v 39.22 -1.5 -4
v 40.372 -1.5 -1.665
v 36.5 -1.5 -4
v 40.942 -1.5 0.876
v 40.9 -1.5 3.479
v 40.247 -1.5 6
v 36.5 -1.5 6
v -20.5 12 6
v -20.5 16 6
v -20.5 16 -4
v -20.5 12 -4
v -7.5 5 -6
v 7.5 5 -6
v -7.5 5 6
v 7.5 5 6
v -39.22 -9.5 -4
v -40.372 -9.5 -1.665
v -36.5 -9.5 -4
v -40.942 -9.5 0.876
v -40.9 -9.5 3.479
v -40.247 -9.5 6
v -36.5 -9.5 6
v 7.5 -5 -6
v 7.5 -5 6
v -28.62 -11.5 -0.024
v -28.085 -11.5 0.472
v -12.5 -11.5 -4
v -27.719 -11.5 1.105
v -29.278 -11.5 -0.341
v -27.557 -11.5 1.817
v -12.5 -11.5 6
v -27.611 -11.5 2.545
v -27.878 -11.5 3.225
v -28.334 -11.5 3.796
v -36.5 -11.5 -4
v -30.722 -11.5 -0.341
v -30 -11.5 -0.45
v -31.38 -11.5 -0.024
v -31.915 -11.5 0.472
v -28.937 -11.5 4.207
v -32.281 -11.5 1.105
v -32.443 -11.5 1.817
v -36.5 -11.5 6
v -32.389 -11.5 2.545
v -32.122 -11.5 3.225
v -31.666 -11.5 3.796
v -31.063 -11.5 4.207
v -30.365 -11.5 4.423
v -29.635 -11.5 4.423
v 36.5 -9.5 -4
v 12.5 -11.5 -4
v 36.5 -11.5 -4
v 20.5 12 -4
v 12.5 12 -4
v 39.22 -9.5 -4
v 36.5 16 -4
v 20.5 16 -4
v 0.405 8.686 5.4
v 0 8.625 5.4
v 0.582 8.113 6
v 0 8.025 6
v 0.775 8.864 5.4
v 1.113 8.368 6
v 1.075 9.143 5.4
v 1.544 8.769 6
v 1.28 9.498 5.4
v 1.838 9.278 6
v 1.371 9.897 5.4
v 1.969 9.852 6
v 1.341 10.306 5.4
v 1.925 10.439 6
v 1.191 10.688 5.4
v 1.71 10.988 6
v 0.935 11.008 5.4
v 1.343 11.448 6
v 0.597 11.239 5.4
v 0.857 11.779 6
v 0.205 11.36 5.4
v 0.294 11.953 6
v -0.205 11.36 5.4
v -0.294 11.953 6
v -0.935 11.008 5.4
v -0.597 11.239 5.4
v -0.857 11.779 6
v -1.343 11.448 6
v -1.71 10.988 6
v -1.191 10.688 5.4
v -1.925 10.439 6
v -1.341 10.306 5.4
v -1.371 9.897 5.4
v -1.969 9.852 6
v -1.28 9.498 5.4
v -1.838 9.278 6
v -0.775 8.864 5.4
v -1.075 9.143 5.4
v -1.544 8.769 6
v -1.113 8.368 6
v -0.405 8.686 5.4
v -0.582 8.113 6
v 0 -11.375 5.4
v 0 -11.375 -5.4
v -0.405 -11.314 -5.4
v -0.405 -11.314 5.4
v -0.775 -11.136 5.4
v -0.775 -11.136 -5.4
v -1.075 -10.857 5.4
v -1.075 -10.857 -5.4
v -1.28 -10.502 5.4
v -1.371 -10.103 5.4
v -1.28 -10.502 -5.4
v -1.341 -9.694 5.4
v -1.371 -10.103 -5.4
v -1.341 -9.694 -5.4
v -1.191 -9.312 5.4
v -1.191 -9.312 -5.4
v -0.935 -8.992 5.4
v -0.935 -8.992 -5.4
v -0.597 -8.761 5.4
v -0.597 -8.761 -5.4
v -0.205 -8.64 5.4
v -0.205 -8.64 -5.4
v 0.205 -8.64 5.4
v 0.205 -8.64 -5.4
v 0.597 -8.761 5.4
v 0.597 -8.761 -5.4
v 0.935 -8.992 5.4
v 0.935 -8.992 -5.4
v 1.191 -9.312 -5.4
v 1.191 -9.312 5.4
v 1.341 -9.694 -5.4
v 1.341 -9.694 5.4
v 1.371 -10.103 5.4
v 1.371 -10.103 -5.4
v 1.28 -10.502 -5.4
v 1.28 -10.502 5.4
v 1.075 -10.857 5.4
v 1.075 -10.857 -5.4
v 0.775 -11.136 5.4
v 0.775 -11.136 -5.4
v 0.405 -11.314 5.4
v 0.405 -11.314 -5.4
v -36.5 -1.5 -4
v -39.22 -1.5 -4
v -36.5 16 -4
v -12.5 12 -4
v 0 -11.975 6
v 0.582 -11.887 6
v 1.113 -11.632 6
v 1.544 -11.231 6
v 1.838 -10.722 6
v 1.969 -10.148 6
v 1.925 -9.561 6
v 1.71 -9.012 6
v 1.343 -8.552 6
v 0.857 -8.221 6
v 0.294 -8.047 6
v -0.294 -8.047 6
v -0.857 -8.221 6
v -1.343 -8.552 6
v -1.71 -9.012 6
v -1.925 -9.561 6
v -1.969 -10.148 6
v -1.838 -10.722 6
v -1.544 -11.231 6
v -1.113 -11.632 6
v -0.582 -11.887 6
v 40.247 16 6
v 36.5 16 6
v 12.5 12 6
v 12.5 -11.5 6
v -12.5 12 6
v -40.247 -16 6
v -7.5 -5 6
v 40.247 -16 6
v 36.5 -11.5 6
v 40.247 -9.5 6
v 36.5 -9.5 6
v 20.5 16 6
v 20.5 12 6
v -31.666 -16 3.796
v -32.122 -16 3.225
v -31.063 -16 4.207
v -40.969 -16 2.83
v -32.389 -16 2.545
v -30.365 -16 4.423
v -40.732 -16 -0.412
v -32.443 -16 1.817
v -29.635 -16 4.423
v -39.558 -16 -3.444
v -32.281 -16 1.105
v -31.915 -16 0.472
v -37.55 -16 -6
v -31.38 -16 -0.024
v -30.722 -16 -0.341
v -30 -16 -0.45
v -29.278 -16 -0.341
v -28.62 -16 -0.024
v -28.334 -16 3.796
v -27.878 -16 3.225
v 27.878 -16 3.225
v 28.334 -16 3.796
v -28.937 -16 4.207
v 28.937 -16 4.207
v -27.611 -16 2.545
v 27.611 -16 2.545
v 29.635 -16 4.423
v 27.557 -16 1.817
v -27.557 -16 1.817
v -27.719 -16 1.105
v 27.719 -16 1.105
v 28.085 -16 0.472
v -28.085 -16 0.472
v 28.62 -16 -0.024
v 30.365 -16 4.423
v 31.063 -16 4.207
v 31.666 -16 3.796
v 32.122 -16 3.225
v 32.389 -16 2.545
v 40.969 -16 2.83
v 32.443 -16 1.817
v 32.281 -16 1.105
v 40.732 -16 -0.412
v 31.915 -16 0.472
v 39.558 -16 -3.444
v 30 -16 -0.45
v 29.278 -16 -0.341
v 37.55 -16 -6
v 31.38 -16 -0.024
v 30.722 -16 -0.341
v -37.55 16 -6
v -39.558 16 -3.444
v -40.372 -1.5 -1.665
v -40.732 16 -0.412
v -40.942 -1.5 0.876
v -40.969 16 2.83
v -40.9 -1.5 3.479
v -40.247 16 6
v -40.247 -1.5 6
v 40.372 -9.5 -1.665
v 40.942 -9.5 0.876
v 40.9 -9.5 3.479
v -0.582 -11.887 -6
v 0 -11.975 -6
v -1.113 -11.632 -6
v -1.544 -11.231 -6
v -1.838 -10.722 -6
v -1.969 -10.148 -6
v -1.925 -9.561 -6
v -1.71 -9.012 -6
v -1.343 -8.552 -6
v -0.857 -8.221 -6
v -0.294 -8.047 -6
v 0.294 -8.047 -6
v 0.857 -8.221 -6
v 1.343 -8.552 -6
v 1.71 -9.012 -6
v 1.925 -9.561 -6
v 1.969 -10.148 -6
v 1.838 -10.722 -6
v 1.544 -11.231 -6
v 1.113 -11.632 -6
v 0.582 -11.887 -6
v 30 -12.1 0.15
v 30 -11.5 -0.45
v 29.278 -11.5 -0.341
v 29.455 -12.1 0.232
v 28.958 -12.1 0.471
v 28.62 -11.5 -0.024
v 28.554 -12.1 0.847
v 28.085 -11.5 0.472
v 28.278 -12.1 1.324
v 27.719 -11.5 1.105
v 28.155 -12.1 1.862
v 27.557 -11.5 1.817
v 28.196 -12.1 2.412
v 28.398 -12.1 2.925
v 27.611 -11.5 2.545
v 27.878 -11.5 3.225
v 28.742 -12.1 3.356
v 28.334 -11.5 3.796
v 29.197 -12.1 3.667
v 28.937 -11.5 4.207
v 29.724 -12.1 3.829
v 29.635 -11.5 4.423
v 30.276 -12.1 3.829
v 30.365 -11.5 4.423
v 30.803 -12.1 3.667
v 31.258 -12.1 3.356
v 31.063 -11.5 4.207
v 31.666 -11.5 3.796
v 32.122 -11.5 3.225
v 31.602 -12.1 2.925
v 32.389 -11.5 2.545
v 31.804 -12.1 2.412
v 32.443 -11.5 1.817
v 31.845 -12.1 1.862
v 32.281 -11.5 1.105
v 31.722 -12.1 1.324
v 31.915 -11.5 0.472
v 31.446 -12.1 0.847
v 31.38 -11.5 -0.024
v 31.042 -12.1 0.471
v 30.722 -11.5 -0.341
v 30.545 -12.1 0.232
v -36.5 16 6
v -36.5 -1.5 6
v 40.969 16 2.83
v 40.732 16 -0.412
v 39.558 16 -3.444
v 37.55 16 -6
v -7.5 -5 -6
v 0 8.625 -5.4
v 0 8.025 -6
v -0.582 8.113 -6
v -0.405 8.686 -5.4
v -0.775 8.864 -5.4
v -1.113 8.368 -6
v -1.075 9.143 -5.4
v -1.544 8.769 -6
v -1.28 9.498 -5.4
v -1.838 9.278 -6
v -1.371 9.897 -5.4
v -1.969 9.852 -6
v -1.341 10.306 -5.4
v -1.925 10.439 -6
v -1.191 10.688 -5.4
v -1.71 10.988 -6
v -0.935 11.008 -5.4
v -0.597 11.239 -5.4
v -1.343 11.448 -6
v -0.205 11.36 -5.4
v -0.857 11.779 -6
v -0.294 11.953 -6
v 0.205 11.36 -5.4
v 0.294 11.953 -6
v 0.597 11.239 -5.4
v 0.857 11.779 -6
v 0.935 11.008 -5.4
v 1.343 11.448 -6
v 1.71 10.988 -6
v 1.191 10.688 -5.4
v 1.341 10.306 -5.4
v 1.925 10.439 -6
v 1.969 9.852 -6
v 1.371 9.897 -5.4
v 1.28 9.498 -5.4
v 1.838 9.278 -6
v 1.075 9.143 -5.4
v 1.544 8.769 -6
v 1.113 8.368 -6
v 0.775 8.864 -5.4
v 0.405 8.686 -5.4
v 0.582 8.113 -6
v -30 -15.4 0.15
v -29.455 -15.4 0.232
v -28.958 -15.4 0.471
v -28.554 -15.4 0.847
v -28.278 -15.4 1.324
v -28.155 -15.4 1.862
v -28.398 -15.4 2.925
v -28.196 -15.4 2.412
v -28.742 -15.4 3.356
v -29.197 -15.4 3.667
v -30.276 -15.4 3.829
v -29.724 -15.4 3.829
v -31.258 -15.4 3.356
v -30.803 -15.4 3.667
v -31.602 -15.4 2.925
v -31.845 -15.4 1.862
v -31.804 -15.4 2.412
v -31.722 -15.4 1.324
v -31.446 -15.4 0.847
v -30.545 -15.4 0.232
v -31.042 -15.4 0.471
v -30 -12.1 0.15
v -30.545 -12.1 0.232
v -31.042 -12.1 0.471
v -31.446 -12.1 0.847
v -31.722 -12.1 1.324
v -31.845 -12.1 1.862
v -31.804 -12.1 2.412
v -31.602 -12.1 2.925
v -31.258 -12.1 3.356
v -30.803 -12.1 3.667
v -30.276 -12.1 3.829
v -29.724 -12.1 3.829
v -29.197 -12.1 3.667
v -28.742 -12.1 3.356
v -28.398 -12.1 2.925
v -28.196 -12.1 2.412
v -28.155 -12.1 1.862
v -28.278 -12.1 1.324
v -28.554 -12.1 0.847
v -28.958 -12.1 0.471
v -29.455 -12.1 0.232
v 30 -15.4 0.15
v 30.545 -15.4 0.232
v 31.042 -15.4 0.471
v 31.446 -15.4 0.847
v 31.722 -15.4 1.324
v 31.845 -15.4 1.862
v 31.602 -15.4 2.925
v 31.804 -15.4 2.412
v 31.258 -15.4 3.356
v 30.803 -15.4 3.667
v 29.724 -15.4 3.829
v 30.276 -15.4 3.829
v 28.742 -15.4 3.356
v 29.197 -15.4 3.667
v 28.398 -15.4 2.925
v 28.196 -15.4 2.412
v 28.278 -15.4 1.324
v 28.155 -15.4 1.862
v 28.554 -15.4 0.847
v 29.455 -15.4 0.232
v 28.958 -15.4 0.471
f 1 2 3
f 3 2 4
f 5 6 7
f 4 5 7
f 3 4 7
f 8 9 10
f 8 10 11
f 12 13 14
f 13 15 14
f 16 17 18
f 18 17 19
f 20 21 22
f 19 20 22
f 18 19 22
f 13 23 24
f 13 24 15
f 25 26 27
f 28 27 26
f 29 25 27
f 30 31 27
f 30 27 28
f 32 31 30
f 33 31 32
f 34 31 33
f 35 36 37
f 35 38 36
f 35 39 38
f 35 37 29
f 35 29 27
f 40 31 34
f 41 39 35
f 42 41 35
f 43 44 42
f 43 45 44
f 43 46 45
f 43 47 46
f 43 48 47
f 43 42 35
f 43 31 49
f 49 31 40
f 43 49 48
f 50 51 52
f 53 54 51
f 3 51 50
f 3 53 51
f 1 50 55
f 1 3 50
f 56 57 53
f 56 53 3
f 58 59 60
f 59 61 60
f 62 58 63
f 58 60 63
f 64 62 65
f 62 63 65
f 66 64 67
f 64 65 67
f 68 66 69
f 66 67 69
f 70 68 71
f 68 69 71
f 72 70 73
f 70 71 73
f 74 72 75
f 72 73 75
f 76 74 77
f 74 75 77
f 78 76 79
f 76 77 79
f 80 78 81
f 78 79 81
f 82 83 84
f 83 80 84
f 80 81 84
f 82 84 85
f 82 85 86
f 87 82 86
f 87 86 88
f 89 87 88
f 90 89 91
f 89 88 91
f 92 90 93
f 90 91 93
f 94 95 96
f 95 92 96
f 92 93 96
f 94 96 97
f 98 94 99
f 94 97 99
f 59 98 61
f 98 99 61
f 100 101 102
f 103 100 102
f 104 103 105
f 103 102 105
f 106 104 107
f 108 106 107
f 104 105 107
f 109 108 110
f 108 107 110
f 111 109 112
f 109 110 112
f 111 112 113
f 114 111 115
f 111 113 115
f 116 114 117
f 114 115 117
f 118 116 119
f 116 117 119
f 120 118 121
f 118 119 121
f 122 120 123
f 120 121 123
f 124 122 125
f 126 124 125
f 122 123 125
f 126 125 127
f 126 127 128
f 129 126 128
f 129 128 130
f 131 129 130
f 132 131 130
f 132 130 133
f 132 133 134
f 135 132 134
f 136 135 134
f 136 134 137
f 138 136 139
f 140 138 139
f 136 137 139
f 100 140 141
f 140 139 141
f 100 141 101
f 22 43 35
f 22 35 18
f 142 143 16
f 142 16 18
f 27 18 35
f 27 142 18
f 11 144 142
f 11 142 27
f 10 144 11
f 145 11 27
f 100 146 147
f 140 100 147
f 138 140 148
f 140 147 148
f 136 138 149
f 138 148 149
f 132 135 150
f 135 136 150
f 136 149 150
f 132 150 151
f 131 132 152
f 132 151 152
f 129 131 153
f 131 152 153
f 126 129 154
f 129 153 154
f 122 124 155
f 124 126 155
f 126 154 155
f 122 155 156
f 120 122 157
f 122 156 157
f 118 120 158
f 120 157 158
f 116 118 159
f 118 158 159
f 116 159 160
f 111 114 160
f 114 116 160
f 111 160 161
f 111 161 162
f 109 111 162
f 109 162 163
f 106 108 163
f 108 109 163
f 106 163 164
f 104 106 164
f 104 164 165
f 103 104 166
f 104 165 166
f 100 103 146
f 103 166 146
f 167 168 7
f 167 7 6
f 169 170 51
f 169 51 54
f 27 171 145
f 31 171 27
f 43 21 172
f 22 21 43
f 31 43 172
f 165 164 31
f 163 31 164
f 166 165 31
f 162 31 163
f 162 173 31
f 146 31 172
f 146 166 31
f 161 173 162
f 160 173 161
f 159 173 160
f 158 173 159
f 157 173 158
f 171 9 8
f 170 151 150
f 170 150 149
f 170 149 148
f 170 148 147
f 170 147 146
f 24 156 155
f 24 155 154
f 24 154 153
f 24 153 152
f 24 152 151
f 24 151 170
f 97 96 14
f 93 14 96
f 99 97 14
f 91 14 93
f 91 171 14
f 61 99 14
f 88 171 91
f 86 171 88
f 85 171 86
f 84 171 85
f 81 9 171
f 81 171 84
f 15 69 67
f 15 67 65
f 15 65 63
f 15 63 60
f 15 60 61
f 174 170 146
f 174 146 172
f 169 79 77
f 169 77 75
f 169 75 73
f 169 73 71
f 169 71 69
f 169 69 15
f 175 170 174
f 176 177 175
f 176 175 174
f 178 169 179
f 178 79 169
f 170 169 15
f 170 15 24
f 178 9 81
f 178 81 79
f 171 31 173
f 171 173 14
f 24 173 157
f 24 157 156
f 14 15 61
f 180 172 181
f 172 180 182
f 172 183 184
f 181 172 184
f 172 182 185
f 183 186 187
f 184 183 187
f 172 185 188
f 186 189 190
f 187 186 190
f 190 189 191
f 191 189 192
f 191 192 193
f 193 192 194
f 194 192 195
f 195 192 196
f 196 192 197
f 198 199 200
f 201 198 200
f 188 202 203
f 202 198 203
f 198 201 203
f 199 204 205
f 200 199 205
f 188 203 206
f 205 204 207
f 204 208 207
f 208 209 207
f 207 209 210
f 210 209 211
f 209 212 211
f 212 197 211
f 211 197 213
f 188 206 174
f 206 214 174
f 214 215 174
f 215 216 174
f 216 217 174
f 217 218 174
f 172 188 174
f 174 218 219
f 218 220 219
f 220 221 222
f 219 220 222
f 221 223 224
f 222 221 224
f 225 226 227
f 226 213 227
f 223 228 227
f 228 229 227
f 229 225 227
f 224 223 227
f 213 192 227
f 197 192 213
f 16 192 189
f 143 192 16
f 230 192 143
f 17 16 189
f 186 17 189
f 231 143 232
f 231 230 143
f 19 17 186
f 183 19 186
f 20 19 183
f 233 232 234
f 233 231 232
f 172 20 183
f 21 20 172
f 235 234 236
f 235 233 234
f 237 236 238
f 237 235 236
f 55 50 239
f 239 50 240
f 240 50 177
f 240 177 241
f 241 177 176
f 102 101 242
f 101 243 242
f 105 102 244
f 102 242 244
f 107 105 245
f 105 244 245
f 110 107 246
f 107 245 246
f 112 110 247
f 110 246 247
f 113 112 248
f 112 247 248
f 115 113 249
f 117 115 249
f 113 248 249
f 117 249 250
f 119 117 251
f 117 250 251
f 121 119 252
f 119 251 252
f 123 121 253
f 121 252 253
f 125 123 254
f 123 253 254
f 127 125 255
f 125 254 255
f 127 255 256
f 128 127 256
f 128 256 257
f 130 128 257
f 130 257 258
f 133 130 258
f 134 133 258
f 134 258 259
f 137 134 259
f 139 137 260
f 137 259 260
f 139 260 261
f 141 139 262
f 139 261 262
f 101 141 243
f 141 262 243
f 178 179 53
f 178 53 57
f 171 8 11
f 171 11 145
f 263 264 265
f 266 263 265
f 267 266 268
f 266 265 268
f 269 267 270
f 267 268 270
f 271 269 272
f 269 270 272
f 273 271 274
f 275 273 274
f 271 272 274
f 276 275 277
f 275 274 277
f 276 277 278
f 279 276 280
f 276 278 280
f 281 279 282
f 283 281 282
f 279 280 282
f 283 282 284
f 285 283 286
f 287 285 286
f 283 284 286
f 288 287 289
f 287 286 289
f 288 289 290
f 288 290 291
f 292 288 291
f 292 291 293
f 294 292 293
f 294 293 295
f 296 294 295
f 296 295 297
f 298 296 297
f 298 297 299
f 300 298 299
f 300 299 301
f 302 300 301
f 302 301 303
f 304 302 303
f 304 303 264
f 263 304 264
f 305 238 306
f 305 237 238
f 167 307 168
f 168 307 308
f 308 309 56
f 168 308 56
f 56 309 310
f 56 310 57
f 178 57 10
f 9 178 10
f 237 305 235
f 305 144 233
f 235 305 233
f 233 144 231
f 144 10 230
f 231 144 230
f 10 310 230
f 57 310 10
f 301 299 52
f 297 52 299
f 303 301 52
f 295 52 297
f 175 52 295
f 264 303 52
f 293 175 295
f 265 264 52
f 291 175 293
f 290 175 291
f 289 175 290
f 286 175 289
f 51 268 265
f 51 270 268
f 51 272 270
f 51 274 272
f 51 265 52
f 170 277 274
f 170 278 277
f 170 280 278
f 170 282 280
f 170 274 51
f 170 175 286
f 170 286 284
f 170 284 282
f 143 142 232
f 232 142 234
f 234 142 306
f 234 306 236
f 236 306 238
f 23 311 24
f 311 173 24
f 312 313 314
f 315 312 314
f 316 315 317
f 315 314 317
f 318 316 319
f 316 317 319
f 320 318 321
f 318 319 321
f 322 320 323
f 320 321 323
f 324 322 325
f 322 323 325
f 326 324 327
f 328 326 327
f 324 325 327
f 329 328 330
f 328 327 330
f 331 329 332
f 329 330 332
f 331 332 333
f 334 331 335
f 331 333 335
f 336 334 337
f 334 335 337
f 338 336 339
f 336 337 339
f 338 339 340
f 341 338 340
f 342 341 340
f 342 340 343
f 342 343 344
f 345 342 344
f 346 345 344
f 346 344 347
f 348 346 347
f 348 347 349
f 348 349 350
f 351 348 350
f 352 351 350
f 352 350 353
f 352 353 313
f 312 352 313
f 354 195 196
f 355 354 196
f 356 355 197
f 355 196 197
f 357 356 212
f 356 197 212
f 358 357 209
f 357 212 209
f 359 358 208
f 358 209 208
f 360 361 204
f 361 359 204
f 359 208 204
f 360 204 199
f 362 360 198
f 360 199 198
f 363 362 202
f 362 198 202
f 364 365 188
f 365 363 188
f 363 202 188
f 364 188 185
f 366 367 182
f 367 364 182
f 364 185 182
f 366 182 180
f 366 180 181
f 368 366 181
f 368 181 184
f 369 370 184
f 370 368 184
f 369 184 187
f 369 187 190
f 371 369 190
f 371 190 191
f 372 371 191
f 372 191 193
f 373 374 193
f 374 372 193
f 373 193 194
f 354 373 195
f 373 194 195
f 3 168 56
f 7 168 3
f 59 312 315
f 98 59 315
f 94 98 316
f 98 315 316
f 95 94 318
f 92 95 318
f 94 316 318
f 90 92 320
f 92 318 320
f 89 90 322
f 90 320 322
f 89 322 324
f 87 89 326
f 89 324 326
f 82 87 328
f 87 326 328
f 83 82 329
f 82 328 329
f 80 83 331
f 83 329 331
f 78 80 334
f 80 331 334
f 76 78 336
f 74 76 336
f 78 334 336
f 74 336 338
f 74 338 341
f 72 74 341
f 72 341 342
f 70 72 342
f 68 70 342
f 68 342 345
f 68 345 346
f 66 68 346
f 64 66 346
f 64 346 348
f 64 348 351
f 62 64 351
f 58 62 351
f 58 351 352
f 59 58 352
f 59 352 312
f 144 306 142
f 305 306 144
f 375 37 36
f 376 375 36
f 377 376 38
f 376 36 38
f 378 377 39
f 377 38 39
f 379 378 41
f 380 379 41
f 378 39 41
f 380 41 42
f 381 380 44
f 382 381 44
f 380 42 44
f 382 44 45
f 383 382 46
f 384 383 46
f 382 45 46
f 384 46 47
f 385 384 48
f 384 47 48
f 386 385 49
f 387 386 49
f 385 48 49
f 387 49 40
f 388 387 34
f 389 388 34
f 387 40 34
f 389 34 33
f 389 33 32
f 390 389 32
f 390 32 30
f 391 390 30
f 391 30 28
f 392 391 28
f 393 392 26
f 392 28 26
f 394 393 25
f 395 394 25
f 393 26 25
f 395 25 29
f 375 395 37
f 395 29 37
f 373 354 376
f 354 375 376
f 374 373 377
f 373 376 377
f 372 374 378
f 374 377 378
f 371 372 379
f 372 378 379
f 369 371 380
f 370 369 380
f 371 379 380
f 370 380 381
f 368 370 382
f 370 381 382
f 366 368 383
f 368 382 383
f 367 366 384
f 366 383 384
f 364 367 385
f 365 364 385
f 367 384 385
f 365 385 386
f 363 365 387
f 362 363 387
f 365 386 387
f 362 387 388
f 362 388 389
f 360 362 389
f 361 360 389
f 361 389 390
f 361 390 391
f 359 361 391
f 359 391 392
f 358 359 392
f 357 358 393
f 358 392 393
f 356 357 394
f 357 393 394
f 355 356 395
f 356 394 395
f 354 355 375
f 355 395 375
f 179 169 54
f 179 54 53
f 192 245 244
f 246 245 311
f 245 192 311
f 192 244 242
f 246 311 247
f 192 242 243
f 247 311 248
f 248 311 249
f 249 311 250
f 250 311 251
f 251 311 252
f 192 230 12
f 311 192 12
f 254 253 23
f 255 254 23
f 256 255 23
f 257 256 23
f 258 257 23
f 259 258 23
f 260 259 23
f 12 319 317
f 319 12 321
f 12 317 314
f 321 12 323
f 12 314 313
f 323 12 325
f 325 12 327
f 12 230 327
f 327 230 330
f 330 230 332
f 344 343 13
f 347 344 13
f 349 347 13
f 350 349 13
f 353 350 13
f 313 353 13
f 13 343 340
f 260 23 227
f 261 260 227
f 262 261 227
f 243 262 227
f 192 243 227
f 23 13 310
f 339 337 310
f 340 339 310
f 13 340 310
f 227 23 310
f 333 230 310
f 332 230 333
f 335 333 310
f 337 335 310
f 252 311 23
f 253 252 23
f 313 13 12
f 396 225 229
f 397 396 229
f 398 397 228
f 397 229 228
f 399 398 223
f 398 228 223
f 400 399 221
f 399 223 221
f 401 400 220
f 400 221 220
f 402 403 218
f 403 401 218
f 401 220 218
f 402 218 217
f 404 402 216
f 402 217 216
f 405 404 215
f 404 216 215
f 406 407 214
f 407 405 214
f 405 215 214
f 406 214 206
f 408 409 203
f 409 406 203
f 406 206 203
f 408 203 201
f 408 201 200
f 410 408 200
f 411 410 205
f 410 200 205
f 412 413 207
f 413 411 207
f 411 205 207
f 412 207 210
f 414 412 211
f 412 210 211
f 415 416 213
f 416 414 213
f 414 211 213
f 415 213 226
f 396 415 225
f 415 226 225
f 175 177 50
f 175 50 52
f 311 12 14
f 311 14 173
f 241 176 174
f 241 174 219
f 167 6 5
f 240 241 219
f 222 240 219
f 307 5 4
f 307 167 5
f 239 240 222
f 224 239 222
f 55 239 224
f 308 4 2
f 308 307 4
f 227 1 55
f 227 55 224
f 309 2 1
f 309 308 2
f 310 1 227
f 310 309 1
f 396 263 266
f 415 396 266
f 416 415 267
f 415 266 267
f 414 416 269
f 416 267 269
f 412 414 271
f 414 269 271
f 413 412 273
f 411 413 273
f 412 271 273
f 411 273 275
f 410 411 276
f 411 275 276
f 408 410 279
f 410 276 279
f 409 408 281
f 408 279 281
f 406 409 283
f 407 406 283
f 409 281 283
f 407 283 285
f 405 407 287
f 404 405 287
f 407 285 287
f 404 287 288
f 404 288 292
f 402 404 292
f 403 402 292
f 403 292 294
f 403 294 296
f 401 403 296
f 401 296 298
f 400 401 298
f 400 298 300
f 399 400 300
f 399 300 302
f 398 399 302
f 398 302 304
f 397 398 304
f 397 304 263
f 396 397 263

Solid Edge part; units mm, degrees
sketch "Sketch1" plane through (0, 0, 0) normal (0, 0, 1) x (1, 0, 0)
  line L0 (-41, -16) -> (41, -16)
  line L1 (41, -16) -> (41, 16)
  line L2 (41, 16) -> (-41, 16)
  line L3 (-41, 16) -> (-41, -16)
  dimension "D1" = 32
  dimension "D2" = 82
extrude "Protrusion1" add sketch "Sketch1" along normal mid plane 12
sketch "Sketch2" plane through (0, 0, 6) normal (0, 0, 1) x (1, 0, 0)
  line L0 (20.5, 16) -> (36.5, 16)
  line L1 (36.5, 16) -> (36.5, -11.5)
  line L2 (36.5, -11.5) -> (12.5, -11.5)
  line L3 (12.5, -11.5) -> (12.5, 12)
  line L4 (12.5, 12) -> (20.5, 12)
  line L5 (20.5, 12) -> (20.5, 16)
  dimension "D1" = 6.5
  dimension "D2" = 24
  dimension "D3" = 16
  dimension "D4" = 4
  dimension "D5" = 27.5
  dimension "D6" = 30
extrude "v_1_servo_cutout" cut sketch "Sketch2" against normal blind 10
sketch "Sketch3" plane through (0, 0, 6) normal (0, 0, 1) x (0, 1, 0)
  line L0 (-9.5, -36.5) -> (-9.5, -41)
  line L1 (-9.5, -41) -> (-1.5, -41)
  line L2 (-1.5, -41) -> (-1.5, -36.5)
  line L3 (-1.5, -36.5) -> (-9.5, -36.5)
  dimension "D1" = 8
  dimension "D2" = 2
extrude "Cutout1" cut sketch "Sketch3" against normal up to vertex (10 mm away)
sketch "Sketch4" plane through (0, 0, 6) normal (0, 0, 1) x (0, 1, 0)
  line L0 (-5, -7.5) -> (5, -7.5)
  line L1 (5, -7.5) -> (5, 7.5)
  line L2 (5, 7.5) -> (-5, 7.5)
  line L3 (-5, 7.5) -> (-5, -7.5)
  dimension "D1" = 15
  dimension "D2" = 10
extrude "Cutout2" cut sketch "Sketch4" against normal up to next
sketch "Sketch5" plane through (0, 16, 0) normal (0, 1, 0) x (1, 0, 0)
  arc A0 (37.5498, 6) -> (40.247, -6) centre (30, -2) cw
  dimension "D1" = 6
  dimension "D2" = 6.5
extrude "Cutout3" cut sketch "Sketch5" against normal through all material side at (40.781, 16, -0.4232)
mirror "Mirror1" about plane through (0, 0, 0) normal (1, 0, 0) of "v_1_servo_cutout", "Cutout1", "Cutout3"
hole "Hole1" at (30, -16, 2) direction (0, 1, 0) diameter 3.7 depth 30 tip angle 118 start chamfer 0.6 start chamfer angle 45 end chamfer 0.6 end chamfer angle 45
hole "Hole2" at (-30, -16, 2) direction (0, 1, 0) diameter 3.7 depth 30 tip angle 118 start chamfer 0.6 start chamfer angle 45 end chamfer 0.6 end chamfer angle 45
hole "Hole3" at (0, 10, 6) direction (0, 0, -1) diameter 2.75 depth 30 tip angle 118 start chamfer 0.6 start chamfer angle 45 end chamfer 0.6 end chamfer angle 45
hole "Hole4" at (0, -10, 6) direction (0, 0, -1) diameter 2.75 depth 30 tip angle 118 start chamfer 0.6 start chamfer angle 45 end chamfer 0.6 end chamfer angle 45
properties material "Polypropylene, general purpose"
